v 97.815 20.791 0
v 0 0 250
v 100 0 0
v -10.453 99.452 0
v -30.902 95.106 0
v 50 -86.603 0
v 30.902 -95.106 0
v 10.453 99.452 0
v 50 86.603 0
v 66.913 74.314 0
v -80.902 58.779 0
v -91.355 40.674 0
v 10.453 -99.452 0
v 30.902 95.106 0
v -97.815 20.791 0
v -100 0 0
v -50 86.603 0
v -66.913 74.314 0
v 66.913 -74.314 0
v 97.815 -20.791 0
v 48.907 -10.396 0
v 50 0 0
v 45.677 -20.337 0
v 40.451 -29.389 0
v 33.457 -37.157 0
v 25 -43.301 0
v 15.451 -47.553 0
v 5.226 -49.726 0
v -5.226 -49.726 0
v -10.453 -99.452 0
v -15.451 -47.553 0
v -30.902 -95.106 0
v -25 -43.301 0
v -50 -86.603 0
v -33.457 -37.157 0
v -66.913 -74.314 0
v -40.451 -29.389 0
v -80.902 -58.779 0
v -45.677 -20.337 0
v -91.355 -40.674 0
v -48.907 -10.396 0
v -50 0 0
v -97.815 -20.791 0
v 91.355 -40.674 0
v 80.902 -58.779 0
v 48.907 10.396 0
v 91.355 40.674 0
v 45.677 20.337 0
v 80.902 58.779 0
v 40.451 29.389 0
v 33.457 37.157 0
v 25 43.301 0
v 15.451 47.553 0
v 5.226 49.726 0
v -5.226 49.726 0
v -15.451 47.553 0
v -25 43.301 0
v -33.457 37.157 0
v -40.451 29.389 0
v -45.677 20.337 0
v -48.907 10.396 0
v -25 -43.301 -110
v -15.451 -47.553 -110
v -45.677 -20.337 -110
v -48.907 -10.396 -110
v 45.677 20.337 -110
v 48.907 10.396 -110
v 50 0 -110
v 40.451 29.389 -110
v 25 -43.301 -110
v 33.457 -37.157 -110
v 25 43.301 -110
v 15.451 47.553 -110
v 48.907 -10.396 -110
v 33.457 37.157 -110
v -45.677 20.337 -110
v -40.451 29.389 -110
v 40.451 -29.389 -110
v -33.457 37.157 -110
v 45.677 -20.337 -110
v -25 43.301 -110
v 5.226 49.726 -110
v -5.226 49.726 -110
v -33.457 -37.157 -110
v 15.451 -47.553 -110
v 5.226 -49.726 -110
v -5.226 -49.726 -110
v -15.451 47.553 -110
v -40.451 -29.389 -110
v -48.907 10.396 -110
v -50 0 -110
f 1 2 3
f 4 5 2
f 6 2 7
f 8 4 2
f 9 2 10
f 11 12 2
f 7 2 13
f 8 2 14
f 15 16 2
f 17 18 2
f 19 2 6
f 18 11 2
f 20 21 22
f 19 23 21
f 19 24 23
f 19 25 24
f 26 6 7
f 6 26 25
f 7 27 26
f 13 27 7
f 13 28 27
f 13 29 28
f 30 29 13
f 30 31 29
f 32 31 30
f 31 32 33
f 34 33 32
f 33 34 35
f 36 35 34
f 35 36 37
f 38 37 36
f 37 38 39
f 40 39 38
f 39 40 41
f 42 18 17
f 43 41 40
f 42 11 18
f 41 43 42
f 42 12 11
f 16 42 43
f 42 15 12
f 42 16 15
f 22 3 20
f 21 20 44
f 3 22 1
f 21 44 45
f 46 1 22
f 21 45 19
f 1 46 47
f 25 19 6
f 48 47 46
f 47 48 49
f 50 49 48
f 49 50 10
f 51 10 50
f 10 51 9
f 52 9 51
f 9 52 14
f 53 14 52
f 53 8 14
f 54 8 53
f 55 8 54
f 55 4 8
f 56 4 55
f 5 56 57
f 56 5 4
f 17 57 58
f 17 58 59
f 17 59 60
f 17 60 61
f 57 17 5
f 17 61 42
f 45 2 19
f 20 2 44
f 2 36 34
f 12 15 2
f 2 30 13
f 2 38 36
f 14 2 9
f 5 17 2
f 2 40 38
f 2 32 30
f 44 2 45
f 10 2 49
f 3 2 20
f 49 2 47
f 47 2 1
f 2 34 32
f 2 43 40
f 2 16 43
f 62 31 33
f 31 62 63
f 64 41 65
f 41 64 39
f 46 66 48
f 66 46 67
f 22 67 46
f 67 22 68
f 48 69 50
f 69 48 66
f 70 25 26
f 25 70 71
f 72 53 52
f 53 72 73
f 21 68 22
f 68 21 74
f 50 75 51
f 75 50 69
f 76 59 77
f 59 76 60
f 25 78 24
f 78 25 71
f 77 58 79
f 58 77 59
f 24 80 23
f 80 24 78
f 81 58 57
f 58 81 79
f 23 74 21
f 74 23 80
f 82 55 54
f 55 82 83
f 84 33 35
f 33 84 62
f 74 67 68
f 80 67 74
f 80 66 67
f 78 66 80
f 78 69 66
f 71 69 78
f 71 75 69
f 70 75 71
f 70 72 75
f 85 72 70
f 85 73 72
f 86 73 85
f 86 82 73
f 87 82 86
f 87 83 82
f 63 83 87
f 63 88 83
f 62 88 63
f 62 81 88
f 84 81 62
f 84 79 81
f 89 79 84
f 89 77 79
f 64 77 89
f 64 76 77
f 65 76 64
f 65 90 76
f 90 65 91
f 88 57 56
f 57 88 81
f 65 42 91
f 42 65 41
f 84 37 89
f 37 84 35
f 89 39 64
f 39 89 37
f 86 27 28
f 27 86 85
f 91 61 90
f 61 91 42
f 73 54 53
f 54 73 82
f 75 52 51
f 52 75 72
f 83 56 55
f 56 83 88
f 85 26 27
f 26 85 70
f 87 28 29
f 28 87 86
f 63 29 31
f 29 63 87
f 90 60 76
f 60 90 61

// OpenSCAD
//Loguncov Maxim 21.01.2014

color([0.3,1,0])
cylinder(250,100,0);

color([1,0.1,0.1])
translate([0,0,-110])
cylinder(200,50,50);
